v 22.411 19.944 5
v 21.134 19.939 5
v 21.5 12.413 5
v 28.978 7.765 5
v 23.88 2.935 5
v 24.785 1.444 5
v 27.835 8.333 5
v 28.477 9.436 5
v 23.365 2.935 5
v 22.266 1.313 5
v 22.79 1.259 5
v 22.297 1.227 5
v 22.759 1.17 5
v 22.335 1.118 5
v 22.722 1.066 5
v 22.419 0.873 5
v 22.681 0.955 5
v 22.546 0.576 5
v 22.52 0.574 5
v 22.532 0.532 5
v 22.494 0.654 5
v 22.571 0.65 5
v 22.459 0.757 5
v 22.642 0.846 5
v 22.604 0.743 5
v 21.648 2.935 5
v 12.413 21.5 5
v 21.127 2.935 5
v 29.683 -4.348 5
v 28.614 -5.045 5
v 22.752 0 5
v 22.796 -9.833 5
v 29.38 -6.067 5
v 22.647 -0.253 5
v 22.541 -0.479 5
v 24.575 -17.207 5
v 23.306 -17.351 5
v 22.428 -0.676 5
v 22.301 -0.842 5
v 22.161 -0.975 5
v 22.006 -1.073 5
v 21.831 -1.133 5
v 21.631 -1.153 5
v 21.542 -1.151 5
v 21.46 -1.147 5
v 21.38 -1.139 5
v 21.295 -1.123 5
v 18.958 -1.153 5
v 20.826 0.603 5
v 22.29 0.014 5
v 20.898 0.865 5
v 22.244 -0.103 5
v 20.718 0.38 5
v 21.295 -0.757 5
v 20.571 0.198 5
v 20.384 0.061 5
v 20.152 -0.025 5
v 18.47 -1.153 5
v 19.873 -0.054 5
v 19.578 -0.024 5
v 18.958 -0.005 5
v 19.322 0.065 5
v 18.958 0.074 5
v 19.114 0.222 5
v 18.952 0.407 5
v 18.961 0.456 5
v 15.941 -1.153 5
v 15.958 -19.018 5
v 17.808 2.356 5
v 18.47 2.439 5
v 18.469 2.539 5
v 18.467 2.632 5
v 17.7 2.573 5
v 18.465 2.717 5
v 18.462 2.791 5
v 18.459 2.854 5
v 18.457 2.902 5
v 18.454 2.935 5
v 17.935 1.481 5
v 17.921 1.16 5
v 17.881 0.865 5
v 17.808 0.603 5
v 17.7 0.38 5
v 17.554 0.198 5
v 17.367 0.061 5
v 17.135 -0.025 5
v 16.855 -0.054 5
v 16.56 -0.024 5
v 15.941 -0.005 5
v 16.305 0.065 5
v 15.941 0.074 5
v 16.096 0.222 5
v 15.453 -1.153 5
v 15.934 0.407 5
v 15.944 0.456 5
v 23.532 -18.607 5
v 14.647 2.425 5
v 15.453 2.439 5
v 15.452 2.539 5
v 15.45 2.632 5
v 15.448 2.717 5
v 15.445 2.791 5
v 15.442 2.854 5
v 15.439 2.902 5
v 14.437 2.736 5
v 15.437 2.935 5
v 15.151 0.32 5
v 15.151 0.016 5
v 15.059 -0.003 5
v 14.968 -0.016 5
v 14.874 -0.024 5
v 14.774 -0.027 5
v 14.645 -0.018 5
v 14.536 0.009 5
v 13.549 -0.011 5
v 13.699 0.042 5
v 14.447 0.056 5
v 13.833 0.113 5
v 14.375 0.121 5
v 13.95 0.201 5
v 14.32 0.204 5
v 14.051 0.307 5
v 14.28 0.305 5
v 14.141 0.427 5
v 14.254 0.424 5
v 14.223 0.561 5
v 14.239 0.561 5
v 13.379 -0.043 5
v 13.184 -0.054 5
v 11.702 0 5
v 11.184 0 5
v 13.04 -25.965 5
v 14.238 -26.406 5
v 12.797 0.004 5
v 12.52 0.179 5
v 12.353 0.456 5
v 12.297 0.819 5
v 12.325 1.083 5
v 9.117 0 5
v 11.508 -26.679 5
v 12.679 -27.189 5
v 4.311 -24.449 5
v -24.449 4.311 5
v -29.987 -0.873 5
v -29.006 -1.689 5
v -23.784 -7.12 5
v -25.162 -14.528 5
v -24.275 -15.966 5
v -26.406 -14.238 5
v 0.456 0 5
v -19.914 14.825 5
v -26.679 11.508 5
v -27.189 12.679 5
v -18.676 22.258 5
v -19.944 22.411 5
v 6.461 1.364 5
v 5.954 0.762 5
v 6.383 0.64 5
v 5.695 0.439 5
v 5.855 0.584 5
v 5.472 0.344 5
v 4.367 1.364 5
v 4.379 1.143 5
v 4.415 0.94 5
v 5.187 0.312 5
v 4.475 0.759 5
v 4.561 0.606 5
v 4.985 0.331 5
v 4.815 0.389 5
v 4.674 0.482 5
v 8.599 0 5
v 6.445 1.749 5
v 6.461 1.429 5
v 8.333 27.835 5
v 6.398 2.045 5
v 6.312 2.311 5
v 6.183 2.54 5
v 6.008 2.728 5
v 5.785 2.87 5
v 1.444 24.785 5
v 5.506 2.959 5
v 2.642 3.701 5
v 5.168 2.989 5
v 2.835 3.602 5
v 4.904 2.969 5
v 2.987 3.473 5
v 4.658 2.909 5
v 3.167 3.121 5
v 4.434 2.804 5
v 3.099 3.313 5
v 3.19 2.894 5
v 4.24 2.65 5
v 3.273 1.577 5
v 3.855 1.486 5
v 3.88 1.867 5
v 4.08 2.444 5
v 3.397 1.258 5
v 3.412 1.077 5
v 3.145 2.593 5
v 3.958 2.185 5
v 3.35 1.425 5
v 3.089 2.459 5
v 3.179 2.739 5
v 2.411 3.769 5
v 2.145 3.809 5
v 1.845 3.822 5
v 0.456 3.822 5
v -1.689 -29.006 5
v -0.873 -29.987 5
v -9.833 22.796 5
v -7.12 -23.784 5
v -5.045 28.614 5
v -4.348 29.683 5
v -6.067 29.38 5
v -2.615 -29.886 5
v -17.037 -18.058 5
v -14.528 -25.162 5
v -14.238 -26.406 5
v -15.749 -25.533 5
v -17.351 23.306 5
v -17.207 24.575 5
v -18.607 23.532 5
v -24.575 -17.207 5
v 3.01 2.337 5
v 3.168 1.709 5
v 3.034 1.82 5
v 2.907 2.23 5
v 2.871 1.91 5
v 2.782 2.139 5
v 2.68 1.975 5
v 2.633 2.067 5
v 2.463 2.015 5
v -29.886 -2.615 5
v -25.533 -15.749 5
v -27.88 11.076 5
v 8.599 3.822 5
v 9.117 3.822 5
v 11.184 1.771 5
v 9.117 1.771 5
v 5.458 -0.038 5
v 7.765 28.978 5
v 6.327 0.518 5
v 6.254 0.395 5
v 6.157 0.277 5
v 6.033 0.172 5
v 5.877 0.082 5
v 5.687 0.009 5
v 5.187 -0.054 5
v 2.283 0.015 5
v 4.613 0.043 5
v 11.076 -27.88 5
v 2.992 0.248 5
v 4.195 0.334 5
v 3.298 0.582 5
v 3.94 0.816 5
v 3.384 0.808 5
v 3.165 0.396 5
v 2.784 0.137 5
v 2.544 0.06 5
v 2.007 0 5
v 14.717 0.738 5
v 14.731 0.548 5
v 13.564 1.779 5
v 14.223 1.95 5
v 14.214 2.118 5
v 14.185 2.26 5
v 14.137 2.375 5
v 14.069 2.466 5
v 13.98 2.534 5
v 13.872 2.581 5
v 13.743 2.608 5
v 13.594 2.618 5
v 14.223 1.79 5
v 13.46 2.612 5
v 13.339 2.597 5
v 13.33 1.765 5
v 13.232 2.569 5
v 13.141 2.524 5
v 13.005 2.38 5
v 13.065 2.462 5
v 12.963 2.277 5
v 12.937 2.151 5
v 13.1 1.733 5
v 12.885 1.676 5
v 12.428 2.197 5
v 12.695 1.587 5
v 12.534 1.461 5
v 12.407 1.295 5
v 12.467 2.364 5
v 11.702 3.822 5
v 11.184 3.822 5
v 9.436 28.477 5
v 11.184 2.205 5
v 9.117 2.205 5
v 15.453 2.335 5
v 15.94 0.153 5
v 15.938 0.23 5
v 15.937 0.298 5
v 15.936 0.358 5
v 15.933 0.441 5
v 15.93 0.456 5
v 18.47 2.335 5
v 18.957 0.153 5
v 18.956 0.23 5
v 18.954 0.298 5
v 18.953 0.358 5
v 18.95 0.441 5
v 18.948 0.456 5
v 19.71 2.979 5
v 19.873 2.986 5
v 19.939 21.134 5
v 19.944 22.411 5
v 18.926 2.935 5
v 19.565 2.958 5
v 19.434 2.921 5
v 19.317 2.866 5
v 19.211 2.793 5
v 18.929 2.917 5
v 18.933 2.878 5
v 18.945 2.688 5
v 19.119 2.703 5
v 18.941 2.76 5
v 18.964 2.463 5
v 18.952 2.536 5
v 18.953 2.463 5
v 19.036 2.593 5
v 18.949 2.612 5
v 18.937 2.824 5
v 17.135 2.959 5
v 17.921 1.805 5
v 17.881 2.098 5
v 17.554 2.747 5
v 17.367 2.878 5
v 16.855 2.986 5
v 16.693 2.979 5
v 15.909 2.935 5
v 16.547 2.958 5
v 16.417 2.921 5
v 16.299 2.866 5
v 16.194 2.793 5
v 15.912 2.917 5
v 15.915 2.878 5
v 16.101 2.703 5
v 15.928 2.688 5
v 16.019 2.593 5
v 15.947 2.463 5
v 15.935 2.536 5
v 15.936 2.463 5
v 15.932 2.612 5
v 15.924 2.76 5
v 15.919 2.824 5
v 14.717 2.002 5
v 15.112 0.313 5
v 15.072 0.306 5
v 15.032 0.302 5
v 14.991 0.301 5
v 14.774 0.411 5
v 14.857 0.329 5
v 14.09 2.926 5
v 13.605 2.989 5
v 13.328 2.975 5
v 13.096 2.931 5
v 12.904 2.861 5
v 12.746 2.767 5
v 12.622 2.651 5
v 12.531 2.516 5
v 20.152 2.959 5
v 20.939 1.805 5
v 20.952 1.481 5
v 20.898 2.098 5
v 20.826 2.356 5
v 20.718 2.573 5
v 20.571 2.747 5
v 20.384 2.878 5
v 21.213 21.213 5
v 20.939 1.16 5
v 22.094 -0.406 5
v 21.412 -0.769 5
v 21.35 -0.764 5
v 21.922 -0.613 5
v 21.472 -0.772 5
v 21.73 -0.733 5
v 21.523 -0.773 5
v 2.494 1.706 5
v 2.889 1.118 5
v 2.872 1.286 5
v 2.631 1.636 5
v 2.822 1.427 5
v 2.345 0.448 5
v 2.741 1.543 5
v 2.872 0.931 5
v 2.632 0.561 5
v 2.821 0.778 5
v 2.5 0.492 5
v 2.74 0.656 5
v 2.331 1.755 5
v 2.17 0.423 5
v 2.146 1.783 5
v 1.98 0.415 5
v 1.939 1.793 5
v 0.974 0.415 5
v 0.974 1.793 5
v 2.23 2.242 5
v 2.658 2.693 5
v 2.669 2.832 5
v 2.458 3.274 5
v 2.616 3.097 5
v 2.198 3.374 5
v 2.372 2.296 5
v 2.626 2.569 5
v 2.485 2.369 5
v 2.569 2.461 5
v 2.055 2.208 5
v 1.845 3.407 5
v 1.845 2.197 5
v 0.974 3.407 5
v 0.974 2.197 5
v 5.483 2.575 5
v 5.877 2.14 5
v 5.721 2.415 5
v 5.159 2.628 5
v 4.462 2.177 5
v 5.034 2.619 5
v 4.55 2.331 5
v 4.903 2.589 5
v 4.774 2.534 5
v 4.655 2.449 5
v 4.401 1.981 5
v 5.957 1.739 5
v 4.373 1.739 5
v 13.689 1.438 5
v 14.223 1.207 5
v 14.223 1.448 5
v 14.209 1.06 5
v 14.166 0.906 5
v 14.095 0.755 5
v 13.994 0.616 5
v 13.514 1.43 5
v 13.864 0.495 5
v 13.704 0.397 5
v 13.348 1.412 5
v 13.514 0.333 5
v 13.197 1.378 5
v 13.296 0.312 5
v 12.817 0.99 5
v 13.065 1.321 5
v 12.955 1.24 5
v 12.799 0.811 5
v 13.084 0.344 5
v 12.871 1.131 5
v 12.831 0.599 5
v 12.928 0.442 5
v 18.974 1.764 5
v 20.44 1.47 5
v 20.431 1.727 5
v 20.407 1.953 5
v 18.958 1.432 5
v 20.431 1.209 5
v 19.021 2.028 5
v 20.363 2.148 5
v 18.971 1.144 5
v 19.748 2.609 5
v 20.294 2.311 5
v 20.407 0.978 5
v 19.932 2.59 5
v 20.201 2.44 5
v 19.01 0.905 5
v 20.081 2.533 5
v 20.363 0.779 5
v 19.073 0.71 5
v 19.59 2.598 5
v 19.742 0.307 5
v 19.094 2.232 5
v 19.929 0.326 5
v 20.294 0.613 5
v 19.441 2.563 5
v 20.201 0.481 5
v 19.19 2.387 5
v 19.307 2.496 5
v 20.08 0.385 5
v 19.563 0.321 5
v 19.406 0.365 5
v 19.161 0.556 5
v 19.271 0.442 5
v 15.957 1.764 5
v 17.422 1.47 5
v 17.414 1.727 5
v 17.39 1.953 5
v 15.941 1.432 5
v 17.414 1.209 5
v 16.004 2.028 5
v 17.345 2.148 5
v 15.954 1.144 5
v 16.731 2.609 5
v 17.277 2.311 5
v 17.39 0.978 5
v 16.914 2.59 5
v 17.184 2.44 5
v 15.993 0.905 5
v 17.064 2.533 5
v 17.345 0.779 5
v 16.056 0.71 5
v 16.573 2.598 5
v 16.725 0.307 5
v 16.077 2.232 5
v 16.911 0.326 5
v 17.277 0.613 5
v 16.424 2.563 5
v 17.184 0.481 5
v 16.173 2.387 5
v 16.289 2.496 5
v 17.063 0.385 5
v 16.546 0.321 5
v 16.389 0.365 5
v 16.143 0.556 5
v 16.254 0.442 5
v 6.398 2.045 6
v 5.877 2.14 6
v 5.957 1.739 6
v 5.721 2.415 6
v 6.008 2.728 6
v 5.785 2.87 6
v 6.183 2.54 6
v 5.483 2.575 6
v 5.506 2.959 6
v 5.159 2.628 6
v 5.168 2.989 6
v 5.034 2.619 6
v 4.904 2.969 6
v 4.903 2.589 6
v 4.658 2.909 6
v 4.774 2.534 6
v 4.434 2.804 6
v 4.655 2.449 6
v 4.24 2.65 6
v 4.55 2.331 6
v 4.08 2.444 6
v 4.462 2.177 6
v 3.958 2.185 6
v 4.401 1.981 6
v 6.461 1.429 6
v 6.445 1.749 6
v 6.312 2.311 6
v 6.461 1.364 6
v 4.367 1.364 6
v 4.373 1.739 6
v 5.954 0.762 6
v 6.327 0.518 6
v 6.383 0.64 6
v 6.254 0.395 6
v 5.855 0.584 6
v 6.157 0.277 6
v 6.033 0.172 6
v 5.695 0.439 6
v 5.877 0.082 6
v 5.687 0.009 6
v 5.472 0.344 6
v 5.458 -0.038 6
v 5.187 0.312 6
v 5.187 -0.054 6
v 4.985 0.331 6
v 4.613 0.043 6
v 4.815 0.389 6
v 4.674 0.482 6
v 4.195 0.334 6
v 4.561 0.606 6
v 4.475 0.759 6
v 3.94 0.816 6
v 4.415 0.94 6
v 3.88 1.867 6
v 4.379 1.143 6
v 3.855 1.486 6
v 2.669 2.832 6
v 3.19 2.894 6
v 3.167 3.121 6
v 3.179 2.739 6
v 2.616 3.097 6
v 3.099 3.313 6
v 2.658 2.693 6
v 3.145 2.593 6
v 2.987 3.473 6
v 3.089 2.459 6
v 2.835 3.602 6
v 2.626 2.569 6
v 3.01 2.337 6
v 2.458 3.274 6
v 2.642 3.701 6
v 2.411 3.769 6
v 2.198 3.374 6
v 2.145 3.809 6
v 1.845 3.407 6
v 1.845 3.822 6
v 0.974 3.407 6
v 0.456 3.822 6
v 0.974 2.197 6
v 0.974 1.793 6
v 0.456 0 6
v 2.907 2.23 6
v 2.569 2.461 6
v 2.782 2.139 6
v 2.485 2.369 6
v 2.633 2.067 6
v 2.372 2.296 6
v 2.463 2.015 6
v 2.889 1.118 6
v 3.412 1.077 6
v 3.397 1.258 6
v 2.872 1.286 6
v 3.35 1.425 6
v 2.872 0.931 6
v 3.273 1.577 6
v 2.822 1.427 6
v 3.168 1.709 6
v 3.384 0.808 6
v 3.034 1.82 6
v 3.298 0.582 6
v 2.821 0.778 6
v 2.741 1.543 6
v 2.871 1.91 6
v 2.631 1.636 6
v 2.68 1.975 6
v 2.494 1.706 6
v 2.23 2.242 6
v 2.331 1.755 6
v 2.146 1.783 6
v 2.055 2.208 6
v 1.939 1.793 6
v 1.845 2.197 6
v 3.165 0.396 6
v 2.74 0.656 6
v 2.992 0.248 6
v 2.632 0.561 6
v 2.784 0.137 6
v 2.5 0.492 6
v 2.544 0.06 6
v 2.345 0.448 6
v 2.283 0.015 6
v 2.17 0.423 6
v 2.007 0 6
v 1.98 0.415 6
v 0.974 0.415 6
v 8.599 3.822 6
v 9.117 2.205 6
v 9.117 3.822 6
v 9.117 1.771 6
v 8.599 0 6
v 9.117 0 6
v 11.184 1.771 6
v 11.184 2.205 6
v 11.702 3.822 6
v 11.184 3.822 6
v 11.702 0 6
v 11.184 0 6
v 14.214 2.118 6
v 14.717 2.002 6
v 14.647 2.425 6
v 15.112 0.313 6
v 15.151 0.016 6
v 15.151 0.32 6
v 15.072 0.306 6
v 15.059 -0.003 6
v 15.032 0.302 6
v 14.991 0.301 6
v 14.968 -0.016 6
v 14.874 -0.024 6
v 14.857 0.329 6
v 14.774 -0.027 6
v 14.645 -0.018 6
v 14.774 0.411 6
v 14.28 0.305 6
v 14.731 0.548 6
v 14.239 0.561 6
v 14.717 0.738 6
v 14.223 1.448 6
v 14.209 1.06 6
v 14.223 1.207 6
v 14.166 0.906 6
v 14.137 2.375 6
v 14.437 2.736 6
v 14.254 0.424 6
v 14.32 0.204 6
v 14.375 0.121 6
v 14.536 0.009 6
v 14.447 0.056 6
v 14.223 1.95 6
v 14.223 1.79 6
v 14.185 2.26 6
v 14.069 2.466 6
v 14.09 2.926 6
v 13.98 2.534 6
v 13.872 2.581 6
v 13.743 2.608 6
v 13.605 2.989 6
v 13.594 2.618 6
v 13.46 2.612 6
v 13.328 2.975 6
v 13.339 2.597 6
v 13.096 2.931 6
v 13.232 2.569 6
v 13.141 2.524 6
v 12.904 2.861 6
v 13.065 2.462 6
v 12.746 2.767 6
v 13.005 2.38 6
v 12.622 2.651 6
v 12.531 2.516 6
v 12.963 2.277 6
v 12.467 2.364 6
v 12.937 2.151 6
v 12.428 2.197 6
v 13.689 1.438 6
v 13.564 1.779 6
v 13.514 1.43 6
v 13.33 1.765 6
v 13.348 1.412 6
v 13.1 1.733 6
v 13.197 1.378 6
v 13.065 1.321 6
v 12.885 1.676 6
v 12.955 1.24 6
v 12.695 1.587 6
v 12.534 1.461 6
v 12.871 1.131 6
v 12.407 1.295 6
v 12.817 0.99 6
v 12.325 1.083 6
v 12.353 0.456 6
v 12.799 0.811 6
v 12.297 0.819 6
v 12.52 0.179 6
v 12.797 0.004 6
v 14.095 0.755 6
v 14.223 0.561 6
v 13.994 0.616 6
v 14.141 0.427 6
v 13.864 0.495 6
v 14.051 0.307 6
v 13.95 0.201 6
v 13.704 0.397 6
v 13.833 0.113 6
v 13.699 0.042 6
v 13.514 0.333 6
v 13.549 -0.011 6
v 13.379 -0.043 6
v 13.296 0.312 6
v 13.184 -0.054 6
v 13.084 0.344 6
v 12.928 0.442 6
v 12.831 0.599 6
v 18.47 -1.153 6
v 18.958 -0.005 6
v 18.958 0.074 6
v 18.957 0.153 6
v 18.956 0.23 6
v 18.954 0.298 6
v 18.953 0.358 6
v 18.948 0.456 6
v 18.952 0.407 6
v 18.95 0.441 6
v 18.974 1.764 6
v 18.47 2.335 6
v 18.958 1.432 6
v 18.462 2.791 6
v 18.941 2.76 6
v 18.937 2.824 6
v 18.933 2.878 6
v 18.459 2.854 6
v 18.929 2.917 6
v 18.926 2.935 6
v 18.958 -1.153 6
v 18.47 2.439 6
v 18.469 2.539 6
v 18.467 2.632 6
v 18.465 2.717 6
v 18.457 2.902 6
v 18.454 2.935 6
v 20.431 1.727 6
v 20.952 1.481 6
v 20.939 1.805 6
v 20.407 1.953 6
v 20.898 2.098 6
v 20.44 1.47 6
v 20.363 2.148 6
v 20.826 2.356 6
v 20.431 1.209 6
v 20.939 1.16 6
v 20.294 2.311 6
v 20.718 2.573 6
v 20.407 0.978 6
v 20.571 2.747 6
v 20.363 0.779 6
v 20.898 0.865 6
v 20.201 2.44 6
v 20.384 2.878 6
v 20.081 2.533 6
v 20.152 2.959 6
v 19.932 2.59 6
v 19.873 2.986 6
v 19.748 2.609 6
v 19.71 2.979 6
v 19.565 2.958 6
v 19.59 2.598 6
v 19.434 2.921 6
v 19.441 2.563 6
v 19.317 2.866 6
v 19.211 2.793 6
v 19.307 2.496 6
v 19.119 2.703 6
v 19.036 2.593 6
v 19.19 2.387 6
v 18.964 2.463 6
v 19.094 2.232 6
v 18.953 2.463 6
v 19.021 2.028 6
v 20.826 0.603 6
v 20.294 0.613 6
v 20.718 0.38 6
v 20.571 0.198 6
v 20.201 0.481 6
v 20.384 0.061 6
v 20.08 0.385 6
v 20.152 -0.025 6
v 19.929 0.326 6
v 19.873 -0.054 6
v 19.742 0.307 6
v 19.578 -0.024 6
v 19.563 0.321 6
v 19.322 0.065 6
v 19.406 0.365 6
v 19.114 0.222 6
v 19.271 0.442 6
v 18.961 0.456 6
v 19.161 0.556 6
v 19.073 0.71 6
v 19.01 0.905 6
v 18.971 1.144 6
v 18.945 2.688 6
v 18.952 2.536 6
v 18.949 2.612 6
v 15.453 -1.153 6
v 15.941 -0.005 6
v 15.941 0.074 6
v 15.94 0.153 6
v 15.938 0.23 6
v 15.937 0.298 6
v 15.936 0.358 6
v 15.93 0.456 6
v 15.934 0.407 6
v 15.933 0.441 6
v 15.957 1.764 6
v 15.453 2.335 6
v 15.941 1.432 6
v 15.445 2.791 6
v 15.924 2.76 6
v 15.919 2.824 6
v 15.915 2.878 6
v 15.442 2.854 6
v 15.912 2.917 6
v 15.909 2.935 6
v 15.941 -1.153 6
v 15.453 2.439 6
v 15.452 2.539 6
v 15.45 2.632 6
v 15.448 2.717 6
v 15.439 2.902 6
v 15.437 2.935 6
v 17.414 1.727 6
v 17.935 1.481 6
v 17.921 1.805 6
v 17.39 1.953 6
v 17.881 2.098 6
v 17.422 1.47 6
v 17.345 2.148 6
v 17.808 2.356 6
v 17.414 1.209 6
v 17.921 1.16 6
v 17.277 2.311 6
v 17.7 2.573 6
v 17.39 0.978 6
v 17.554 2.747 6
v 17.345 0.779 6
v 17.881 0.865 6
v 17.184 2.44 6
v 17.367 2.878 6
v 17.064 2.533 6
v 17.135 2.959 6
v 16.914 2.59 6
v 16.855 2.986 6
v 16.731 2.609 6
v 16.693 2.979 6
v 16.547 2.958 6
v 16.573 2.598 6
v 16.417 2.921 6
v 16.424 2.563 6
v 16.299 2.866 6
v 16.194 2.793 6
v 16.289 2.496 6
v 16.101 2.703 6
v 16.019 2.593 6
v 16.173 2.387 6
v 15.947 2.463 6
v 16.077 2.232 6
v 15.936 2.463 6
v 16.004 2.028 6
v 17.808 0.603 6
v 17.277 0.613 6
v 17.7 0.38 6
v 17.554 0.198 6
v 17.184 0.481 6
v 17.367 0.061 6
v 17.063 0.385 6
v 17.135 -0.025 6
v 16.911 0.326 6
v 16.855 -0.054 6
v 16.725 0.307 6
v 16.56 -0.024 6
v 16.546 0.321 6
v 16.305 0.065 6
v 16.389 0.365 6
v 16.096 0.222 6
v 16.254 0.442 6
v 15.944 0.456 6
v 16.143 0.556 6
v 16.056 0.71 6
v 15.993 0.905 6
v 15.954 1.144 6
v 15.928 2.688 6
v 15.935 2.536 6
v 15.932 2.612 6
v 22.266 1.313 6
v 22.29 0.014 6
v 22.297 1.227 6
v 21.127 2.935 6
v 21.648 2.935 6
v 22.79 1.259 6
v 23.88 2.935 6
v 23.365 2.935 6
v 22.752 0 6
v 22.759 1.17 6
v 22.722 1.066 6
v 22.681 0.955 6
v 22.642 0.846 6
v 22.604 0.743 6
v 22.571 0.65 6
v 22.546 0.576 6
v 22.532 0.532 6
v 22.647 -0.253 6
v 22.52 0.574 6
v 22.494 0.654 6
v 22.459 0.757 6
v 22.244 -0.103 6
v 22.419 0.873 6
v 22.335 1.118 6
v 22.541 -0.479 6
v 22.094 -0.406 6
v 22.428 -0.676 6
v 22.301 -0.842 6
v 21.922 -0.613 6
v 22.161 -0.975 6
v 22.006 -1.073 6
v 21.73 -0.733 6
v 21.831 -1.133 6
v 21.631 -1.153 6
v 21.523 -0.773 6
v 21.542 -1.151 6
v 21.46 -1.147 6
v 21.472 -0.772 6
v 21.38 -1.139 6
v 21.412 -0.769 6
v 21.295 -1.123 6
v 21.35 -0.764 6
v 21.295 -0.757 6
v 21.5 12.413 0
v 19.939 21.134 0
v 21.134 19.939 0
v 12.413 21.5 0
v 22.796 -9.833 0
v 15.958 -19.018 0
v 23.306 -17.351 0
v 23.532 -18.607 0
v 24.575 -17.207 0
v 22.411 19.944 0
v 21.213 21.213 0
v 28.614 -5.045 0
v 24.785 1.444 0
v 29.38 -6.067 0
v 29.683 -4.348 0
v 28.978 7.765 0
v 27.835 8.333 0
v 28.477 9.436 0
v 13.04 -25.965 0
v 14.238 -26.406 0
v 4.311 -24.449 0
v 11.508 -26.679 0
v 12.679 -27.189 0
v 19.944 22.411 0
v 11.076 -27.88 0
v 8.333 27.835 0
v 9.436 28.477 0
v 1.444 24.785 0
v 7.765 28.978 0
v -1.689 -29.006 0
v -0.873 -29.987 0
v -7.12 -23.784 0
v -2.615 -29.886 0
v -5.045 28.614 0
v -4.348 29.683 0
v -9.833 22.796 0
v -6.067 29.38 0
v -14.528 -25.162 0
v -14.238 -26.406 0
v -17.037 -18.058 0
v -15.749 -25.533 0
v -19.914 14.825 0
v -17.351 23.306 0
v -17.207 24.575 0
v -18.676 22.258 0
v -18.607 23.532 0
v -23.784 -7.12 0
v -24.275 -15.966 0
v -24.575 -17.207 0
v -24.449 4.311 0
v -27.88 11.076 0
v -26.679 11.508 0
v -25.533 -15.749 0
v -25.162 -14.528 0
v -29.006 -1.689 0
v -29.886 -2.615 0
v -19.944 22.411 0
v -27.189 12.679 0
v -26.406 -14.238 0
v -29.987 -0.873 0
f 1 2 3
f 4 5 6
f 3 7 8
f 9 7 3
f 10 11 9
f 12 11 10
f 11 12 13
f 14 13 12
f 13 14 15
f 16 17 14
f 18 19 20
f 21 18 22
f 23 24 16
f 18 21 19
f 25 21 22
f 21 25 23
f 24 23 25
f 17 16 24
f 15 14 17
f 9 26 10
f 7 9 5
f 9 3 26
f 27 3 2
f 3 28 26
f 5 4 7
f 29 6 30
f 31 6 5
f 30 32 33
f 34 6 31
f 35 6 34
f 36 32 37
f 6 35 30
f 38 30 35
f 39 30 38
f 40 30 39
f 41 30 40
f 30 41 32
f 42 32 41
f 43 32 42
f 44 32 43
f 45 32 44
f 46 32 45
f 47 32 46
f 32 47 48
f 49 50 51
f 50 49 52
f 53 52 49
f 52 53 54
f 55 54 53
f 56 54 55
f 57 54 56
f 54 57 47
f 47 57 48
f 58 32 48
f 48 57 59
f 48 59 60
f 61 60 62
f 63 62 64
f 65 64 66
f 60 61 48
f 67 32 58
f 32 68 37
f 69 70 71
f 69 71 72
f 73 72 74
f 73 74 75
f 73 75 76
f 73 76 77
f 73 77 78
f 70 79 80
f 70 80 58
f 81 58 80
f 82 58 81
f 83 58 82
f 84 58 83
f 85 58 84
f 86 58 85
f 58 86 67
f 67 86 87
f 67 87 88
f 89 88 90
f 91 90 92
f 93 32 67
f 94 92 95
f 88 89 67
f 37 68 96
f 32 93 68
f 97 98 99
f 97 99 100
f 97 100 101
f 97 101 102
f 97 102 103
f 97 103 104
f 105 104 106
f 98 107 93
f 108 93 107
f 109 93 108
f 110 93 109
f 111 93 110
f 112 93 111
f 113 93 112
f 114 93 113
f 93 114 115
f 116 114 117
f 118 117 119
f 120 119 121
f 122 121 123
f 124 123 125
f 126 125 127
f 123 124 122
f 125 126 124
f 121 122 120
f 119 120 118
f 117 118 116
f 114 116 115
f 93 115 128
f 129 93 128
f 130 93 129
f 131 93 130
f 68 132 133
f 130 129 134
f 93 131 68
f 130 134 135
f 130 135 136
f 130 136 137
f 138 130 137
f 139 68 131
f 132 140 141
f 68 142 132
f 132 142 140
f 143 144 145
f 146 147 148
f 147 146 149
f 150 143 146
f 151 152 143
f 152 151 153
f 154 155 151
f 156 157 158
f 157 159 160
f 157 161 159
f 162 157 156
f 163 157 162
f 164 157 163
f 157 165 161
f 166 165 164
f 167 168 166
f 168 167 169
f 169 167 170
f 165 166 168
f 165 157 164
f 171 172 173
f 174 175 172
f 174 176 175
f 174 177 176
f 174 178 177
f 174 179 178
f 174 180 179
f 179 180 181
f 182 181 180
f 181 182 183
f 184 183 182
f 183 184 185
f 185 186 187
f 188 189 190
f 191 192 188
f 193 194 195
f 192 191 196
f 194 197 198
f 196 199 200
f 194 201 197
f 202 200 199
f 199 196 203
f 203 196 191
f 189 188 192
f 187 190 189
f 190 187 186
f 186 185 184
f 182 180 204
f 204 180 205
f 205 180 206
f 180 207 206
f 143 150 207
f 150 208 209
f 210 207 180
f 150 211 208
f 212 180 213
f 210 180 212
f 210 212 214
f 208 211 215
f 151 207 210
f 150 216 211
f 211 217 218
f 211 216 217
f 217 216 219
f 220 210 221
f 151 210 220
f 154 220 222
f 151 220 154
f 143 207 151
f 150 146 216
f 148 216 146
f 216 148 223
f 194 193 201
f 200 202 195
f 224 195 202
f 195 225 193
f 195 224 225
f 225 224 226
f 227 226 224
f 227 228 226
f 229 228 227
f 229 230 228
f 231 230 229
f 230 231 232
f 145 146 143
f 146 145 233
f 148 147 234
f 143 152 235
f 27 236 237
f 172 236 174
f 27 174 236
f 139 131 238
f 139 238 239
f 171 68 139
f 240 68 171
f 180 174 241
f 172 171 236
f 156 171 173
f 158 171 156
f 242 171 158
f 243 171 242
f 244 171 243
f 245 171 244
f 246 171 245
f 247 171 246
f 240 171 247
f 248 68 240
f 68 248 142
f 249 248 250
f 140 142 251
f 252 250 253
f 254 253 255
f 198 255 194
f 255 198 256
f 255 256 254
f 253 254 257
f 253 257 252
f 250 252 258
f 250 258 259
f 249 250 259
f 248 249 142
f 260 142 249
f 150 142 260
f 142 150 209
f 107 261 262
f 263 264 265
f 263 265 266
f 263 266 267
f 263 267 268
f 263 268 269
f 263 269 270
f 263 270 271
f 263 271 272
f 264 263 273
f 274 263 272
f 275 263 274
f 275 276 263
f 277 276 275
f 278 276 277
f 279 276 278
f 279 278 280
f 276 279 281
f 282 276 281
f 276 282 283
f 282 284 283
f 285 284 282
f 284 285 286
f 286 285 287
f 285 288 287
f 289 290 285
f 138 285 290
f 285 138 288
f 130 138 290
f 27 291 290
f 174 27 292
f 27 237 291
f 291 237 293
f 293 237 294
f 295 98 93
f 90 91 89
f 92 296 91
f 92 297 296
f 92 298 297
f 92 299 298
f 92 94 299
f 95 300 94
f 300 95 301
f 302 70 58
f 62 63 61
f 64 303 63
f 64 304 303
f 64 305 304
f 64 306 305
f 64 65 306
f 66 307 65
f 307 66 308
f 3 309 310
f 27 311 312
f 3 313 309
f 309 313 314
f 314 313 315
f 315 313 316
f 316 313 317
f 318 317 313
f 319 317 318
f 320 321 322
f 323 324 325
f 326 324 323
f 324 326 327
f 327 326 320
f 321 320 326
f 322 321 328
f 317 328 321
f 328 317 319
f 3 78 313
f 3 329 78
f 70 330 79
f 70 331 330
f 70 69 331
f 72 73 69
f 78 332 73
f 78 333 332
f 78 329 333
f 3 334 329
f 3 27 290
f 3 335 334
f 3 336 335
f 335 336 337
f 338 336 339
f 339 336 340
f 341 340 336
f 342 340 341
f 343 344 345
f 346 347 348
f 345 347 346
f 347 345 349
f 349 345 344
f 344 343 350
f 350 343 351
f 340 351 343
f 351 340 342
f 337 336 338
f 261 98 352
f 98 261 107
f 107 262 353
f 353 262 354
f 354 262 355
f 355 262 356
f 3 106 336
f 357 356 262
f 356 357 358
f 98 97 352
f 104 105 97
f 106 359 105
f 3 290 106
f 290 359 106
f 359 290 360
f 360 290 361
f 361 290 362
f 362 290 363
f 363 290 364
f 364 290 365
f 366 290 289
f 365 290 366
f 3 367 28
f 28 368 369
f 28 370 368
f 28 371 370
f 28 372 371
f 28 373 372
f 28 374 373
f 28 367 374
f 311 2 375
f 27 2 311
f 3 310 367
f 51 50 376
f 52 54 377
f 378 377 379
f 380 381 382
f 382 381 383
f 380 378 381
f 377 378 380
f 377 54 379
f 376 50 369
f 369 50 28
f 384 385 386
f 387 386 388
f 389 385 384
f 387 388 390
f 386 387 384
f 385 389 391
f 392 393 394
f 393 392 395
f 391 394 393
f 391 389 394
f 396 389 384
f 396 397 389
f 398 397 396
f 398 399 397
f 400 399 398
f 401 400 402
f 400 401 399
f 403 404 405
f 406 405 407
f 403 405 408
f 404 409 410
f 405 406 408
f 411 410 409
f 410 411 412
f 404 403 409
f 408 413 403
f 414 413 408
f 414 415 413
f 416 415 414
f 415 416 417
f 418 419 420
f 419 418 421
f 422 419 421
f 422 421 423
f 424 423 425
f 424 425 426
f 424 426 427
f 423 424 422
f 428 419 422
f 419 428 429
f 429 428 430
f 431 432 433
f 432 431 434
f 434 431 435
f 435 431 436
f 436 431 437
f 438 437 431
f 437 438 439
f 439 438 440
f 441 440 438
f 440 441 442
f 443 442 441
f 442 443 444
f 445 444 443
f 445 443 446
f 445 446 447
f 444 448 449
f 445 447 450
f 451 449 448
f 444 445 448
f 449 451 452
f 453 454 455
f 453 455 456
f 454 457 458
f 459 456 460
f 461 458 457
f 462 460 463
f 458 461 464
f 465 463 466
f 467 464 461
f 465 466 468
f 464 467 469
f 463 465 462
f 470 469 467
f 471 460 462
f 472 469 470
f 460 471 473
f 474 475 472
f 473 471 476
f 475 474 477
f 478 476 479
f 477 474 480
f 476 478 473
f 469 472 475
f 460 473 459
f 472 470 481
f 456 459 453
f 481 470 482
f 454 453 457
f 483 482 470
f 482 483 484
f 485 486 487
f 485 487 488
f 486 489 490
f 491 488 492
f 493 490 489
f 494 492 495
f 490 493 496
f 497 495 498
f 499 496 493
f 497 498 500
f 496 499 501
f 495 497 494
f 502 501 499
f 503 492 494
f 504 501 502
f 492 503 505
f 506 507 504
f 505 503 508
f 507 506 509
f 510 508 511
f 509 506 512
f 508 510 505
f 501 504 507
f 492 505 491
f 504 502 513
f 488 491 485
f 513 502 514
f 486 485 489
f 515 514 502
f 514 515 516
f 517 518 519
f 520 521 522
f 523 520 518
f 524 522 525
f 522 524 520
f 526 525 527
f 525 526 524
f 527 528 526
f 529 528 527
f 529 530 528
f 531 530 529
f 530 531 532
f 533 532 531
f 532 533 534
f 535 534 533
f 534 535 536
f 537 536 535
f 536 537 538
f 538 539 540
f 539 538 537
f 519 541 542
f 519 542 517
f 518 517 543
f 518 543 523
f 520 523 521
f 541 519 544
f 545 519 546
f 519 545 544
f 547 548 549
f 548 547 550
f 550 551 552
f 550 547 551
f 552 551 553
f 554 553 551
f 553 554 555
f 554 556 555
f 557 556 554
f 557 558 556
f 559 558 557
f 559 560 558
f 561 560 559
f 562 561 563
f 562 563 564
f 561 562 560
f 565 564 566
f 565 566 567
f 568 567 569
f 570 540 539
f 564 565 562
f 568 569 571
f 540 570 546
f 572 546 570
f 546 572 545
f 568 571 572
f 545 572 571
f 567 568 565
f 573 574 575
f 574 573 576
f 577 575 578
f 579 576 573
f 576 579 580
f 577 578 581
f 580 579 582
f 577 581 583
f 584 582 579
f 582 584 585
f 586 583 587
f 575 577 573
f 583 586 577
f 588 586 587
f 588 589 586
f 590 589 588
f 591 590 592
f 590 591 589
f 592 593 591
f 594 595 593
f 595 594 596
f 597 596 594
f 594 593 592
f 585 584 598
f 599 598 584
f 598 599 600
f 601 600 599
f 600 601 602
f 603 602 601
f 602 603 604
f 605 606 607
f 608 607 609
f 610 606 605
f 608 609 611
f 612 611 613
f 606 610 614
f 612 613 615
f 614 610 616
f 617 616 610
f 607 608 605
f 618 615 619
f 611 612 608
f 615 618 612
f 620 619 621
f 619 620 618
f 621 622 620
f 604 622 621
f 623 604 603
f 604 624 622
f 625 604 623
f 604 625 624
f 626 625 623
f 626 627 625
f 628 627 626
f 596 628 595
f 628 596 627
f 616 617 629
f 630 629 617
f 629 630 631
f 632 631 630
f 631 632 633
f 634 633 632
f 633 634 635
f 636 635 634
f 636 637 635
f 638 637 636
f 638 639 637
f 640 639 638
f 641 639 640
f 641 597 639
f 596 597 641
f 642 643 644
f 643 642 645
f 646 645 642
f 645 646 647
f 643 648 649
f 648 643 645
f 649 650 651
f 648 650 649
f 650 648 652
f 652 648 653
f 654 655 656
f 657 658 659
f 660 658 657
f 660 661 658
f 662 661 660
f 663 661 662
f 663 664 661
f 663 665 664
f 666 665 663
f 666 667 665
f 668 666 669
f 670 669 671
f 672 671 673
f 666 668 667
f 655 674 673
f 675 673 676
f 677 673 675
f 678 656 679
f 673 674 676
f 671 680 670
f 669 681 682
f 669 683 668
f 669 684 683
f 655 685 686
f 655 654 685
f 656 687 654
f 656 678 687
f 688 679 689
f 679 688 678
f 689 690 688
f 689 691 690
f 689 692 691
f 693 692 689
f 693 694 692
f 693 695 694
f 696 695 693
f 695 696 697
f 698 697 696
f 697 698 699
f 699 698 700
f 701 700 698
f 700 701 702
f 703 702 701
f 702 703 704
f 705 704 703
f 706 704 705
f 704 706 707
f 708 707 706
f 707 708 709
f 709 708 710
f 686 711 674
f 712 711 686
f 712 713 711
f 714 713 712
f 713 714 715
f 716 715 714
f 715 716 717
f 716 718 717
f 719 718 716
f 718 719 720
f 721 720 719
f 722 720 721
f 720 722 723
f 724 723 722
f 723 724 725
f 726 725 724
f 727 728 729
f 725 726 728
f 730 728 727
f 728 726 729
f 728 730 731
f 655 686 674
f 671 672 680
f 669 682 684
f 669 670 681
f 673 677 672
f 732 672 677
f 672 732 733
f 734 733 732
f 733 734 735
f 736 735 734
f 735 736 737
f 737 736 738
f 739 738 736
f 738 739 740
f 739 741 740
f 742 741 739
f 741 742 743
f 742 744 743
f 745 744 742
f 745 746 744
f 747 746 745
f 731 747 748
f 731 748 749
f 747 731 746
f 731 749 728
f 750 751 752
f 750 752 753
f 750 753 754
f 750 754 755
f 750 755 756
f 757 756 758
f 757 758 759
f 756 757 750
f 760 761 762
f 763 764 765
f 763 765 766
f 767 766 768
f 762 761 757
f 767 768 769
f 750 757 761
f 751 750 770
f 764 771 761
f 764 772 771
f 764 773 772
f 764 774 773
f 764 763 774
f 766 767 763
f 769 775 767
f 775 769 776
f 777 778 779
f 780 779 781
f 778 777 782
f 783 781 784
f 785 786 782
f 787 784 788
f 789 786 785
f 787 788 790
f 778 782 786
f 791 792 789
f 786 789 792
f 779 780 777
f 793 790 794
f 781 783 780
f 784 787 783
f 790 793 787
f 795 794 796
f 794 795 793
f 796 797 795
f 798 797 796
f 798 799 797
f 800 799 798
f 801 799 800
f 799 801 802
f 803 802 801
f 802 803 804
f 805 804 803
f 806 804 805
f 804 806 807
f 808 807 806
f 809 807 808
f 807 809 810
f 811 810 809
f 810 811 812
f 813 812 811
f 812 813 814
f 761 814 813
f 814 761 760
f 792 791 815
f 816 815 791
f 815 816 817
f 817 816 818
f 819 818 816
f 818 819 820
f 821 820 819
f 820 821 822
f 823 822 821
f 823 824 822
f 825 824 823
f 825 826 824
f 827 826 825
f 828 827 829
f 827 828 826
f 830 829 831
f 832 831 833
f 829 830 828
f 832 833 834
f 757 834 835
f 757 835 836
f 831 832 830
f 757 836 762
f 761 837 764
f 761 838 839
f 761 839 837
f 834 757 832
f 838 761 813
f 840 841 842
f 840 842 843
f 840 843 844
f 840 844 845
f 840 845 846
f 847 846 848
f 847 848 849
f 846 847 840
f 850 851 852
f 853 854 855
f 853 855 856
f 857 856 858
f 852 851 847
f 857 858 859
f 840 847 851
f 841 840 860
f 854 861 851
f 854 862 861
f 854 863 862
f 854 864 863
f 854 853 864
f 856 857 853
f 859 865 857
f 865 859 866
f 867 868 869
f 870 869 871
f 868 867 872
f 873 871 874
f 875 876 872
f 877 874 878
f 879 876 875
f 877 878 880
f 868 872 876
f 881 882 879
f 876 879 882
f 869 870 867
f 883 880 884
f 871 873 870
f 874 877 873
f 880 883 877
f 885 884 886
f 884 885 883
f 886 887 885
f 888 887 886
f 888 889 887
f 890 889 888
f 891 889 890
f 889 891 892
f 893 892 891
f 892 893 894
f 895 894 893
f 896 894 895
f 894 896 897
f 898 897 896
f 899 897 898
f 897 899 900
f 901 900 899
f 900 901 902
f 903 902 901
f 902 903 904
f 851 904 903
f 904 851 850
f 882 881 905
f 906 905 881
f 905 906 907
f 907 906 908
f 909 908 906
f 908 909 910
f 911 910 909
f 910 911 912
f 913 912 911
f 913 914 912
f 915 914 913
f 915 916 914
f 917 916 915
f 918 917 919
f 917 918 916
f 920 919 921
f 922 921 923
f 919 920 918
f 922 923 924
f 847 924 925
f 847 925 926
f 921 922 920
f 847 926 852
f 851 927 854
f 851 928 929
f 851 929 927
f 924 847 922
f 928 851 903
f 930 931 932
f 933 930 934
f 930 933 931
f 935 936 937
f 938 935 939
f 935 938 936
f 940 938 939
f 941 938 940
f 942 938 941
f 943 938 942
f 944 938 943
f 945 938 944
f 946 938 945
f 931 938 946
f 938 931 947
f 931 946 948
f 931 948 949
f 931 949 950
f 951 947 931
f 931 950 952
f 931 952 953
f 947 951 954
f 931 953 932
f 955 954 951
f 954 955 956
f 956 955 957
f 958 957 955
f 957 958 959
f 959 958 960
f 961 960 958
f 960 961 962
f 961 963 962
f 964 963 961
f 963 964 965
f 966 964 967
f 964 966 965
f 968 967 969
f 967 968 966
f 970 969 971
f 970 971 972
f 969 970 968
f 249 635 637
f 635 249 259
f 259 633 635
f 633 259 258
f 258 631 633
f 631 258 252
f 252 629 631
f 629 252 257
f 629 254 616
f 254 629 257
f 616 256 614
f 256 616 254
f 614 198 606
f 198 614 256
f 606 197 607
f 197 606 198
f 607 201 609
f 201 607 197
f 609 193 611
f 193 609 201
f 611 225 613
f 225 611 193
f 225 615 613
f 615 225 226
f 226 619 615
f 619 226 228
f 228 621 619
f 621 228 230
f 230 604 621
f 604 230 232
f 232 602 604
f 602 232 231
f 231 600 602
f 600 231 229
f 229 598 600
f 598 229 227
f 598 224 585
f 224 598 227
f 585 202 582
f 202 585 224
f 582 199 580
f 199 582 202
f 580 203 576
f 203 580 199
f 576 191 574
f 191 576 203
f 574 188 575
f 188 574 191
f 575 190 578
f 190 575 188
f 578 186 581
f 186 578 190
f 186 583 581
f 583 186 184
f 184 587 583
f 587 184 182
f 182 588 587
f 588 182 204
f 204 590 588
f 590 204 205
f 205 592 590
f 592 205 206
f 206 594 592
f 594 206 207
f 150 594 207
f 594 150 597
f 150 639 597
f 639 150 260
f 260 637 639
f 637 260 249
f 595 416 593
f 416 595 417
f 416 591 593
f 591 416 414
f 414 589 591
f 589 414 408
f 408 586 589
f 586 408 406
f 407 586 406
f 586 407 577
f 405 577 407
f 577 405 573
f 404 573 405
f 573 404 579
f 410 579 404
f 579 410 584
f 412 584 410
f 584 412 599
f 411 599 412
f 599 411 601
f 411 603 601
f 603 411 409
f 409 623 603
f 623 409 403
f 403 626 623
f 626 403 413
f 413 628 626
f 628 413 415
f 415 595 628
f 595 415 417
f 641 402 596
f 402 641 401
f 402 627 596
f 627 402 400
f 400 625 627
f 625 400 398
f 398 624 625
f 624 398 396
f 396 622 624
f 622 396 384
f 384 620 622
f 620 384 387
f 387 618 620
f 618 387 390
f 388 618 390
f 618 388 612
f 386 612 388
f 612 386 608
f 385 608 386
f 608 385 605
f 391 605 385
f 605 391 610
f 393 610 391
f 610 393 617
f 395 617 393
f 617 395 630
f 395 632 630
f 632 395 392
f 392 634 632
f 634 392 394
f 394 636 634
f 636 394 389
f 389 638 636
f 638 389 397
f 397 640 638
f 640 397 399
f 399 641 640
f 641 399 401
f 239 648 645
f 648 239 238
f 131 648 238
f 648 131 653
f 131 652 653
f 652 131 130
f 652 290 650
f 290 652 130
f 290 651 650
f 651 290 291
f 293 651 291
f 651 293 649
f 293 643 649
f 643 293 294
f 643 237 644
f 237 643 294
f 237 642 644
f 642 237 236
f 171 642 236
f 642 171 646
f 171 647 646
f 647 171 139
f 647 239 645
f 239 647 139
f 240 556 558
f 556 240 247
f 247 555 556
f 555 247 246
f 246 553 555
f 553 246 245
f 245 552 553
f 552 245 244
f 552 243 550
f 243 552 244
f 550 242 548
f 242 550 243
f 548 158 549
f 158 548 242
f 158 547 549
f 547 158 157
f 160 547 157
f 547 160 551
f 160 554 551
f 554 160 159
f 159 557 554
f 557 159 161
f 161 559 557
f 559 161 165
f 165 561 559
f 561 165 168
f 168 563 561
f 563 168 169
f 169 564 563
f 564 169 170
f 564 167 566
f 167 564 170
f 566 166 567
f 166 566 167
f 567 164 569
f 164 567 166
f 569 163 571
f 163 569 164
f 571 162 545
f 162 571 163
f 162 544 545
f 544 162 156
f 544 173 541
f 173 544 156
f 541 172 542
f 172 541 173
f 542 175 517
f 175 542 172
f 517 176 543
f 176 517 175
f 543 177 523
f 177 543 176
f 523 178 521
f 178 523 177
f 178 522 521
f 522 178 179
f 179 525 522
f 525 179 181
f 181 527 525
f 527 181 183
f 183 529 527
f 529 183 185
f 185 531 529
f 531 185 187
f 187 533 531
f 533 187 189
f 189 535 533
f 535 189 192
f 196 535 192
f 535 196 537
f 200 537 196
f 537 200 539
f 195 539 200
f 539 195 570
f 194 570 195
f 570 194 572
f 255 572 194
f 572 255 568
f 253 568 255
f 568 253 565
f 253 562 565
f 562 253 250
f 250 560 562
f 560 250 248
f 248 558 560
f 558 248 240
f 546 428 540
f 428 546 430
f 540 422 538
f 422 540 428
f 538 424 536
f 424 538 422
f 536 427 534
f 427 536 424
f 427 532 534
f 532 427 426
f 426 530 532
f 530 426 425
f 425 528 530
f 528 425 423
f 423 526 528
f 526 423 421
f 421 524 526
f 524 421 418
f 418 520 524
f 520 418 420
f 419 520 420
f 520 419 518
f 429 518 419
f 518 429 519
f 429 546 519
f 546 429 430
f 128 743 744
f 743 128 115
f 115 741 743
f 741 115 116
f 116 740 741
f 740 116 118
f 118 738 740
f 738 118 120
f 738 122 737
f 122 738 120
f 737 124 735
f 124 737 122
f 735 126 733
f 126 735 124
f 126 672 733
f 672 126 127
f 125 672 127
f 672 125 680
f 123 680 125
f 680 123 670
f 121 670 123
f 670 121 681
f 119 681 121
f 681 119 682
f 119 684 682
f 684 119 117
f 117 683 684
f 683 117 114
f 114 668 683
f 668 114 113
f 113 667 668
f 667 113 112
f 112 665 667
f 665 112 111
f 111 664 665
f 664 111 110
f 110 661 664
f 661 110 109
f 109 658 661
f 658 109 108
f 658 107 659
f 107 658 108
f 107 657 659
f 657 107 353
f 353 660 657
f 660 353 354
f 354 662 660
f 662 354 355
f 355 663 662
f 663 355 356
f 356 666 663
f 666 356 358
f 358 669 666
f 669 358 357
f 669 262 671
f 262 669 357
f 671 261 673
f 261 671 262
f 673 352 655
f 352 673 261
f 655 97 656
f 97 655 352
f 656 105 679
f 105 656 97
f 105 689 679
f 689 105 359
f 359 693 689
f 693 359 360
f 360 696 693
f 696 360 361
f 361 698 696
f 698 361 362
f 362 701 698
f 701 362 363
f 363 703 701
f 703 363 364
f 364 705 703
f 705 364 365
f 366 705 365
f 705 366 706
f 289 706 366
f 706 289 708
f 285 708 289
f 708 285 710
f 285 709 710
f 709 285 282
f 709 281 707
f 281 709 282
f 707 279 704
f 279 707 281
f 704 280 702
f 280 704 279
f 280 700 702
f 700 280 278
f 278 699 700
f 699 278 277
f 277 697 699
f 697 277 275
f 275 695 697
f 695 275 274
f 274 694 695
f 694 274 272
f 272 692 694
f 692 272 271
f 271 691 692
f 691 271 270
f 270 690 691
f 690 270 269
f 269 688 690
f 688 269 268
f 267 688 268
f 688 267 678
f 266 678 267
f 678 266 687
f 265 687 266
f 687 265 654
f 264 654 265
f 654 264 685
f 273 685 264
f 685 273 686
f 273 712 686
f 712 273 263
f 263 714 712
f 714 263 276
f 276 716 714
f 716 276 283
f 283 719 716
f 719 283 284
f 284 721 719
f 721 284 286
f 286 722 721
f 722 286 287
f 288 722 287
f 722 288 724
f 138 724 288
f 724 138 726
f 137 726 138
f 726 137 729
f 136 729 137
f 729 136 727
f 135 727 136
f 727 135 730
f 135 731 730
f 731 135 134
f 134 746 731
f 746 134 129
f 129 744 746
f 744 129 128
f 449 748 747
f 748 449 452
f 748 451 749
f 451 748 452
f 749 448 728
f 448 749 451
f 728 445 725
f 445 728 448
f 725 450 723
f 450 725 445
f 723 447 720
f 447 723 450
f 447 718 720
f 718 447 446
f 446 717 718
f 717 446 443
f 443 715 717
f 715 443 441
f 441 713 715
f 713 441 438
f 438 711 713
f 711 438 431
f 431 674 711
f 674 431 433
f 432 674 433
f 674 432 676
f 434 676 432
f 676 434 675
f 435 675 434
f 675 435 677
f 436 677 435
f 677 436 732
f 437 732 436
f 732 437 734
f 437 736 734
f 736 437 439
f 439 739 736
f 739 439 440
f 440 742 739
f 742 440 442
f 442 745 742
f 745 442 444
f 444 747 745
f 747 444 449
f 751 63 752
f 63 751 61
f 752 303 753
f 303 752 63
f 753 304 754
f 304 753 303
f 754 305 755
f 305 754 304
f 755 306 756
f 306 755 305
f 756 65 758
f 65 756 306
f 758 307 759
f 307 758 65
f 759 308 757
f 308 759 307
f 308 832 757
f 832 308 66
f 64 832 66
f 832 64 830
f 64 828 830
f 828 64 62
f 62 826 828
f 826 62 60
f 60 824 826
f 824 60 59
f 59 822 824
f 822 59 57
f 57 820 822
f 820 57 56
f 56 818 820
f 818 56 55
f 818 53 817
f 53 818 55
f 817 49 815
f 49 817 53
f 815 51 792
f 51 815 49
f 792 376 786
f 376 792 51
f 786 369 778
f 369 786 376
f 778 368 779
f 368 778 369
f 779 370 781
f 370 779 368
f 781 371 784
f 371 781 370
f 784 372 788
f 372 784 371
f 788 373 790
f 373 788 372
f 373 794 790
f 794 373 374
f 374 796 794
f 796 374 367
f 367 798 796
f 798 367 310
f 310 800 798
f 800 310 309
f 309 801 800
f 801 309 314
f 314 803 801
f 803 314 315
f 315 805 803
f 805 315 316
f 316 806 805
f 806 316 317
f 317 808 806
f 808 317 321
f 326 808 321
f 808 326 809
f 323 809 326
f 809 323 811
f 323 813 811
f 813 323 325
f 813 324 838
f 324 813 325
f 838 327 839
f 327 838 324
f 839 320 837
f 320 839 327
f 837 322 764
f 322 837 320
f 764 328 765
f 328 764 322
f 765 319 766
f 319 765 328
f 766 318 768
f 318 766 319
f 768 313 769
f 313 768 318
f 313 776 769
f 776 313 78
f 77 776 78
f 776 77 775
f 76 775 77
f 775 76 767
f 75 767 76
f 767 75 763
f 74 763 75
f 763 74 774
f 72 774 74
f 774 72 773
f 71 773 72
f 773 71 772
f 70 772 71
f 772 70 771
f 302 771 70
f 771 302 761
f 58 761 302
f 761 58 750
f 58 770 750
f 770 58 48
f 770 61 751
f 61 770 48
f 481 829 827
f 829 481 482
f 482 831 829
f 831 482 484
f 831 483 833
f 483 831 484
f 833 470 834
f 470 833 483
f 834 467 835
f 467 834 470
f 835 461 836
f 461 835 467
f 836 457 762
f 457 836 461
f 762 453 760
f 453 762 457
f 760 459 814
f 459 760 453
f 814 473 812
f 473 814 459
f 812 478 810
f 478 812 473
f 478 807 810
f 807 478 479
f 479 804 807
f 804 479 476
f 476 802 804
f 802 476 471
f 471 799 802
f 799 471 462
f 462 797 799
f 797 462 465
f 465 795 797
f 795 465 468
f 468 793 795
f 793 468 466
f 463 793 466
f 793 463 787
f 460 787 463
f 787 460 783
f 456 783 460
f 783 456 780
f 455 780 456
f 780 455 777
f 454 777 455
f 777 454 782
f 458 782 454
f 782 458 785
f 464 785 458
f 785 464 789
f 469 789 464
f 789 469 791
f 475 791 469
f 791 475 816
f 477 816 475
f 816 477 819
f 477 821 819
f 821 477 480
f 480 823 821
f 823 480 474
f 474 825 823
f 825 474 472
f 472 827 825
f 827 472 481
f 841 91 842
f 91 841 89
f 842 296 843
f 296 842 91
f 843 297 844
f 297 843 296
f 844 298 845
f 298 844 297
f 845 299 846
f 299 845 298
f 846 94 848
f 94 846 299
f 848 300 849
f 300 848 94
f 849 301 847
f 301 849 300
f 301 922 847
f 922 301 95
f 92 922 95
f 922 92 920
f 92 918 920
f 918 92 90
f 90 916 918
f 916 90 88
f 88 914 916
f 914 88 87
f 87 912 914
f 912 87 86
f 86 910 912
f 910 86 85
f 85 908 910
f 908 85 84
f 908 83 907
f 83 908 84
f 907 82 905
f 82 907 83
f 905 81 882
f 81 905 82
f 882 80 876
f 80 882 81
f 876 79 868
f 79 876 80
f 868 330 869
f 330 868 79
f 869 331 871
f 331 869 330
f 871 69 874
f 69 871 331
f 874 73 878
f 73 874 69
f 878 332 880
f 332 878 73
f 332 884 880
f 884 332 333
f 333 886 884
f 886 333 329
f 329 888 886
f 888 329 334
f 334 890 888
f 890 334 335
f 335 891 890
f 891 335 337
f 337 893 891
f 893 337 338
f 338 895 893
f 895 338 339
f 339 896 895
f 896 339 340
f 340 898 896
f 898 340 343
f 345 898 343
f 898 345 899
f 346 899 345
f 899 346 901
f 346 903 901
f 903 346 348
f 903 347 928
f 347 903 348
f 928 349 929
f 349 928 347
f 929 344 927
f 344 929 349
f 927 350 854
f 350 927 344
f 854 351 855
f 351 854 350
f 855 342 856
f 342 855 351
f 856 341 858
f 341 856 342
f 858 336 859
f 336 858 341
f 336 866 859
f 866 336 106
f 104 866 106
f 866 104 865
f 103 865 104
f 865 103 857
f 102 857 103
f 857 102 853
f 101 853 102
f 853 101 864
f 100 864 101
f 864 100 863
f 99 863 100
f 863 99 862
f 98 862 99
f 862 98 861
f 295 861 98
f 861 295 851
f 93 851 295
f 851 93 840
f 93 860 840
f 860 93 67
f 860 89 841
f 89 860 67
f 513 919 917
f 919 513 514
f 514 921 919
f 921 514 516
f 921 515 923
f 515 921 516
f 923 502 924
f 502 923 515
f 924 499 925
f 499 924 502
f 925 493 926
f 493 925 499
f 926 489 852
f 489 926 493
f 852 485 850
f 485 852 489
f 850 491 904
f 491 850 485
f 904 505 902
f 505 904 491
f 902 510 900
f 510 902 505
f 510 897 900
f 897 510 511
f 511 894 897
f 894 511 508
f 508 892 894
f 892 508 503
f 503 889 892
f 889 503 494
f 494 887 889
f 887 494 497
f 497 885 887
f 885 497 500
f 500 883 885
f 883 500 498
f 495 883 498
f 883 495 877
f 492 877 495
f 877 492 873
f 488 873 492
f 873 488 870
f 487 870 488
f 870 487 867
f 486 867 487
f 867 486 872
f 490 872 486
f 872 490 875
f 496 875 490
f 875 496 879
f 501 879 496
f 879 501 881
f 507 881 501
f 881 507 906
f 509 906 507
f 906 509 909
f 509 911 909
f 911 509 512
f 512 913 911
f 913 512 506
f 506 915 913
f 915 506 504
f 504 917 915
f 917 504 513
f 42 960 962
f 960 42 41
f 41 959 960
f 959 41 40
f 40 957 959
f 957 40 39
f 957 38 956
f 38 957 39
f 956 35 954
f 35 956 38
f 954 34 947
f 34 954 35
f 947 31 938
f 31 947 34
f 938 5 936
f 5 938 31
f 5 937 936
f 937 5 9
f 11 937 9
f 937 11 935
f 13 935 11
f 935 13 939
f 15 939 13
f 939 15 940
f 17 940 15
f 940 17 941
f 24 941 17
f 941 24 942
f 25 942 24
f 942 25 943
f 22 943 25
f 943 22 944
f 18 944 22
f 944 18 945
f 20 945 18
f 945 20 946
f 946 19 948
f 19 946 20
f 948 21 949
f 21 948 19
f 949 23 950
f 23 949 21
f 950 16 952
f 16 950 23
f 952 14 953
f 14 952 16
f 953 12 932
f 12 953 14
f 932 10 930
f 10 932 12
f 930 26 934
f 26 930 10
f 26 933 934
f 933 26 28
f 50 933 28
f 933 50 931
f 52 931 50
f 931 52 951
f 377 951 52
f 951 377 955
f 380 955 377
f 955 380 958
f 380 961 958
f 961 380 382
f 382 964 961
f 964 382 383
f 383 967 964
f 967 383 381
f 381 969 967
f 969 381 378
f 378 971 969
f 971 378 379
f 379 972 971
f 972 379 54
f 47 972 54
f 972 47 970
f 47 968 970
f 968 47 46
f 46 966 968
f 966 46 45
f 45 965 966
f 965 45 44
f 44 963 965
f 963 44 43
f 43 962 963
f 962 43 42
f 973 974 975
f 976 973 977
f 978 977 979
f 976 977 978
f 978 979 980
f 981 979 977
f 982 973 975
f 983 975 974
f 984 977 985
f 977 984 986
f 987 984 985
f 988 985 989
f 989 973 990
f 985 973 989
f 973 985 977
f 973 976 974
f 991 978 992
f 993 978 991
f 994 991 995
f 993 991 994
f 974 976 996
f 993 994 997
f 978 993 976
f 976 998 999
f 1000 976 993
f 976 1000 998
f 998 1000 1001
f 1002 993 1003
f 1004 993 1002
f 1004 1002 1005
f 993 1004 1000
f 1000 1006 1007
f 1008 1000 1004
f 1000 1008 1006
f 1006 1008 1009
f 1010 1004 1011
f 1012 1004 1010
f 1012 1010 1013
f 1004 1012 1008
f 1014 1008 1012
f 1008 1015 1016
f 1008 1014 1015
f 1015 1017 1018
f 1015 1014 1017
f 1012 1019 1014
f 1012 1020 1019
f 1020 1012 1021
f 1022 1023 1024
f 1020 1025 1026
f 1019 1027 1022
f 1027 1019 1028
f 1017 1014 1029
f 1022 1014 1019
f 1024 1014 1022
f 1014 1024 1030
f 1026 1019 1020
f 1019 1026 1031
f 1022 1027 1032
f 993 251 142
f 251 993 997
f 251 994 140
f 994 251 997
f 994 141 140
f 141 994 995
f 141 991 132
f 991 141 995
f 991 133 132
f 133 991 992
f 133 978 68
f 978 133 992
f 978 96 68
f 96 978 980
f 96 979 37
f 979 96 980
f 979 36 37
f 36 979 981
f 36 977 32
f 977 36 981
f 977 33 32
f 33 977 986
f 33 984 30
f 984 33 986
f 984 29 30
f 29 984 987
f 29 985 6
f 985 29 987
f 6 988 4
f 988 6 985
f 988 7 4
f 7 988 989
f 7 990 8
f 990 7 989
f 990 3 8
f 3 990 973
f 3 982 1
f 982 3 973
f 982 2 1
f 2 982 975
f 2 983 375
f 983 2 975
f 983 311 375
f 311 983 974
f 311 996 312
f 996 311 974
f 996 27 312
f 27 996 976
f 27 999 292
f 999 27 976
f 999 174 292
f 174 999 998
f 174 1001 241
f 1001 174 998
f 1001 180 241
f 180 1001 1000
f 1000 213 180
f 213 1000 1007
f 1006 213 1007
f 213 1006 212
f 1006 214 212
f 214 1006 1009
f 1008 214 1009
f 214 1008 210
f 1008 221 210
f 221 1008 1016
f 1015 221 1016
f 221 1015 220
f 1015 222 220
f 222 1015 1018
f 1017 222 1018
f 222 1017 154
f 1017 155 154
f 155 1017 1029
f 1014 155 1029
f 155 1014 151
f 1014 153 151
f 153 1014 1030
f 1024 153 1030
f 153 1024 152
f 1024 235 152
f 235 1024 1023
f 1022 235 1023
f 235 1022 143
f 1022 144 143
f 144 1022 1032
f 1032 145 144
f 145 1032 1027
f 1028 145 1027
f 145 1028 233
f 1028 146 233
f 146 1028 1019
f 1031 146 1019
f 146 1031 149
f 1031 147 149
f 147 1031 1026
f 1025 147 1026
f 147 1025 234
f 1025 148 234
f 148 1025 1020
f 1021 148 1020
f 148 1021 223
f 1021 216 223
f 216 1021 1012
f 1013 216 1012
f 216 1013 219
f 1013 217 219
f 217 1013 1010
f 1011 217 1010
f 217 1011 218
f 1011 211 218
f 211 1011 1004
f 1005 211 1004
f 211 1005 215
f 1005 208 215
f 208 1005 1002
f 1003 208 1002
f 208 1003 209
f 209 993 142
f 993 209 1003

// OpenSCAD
text = "Be Happy";
height = 5;
size = 4.0;


translate([0, 0, 5])
    linear_extrude(1)
        text(text, size = 4.0);
  
linear_extrude(height)
Abstract(30,20,30);



// points = number of points (minimum 3)
// outer  = radius to outer points
// inner  = radius to inner points
module Abstract(points, outer, inner) {
	
	// polar to cartesian: radius/angle to x/y
	function x(r, a) = r * cos(a);
	function y(r, a) = r * sin(a);
	
	// angular width of each pie slice of the star
	increment = 2500/points;
	
	union() {
		for (p = [0 : points-1]) {
			
			// outer is outer point p
			// inner is inner point following p
			// next is next outer point following p

			assign(	x_outer = x(outer, increment * p),
					y_outer = y(outer, increment * p),
					x_inner = x(inner, (increment * p) + (increment/2)),
					y_inner = y(inner, (increment * p) + (increment/2)),
					x_next  = x(outer, increment * (p+1)),
					y_next  = y(outer, increment * (p+1))) {
				polygon(points = [[x_outer, y_outer], [x_inner, y_inner], [x_next, y_next], [0, 0]], paths  = [[0, 1, 2, 3]]);
			}
		}
	}
}
